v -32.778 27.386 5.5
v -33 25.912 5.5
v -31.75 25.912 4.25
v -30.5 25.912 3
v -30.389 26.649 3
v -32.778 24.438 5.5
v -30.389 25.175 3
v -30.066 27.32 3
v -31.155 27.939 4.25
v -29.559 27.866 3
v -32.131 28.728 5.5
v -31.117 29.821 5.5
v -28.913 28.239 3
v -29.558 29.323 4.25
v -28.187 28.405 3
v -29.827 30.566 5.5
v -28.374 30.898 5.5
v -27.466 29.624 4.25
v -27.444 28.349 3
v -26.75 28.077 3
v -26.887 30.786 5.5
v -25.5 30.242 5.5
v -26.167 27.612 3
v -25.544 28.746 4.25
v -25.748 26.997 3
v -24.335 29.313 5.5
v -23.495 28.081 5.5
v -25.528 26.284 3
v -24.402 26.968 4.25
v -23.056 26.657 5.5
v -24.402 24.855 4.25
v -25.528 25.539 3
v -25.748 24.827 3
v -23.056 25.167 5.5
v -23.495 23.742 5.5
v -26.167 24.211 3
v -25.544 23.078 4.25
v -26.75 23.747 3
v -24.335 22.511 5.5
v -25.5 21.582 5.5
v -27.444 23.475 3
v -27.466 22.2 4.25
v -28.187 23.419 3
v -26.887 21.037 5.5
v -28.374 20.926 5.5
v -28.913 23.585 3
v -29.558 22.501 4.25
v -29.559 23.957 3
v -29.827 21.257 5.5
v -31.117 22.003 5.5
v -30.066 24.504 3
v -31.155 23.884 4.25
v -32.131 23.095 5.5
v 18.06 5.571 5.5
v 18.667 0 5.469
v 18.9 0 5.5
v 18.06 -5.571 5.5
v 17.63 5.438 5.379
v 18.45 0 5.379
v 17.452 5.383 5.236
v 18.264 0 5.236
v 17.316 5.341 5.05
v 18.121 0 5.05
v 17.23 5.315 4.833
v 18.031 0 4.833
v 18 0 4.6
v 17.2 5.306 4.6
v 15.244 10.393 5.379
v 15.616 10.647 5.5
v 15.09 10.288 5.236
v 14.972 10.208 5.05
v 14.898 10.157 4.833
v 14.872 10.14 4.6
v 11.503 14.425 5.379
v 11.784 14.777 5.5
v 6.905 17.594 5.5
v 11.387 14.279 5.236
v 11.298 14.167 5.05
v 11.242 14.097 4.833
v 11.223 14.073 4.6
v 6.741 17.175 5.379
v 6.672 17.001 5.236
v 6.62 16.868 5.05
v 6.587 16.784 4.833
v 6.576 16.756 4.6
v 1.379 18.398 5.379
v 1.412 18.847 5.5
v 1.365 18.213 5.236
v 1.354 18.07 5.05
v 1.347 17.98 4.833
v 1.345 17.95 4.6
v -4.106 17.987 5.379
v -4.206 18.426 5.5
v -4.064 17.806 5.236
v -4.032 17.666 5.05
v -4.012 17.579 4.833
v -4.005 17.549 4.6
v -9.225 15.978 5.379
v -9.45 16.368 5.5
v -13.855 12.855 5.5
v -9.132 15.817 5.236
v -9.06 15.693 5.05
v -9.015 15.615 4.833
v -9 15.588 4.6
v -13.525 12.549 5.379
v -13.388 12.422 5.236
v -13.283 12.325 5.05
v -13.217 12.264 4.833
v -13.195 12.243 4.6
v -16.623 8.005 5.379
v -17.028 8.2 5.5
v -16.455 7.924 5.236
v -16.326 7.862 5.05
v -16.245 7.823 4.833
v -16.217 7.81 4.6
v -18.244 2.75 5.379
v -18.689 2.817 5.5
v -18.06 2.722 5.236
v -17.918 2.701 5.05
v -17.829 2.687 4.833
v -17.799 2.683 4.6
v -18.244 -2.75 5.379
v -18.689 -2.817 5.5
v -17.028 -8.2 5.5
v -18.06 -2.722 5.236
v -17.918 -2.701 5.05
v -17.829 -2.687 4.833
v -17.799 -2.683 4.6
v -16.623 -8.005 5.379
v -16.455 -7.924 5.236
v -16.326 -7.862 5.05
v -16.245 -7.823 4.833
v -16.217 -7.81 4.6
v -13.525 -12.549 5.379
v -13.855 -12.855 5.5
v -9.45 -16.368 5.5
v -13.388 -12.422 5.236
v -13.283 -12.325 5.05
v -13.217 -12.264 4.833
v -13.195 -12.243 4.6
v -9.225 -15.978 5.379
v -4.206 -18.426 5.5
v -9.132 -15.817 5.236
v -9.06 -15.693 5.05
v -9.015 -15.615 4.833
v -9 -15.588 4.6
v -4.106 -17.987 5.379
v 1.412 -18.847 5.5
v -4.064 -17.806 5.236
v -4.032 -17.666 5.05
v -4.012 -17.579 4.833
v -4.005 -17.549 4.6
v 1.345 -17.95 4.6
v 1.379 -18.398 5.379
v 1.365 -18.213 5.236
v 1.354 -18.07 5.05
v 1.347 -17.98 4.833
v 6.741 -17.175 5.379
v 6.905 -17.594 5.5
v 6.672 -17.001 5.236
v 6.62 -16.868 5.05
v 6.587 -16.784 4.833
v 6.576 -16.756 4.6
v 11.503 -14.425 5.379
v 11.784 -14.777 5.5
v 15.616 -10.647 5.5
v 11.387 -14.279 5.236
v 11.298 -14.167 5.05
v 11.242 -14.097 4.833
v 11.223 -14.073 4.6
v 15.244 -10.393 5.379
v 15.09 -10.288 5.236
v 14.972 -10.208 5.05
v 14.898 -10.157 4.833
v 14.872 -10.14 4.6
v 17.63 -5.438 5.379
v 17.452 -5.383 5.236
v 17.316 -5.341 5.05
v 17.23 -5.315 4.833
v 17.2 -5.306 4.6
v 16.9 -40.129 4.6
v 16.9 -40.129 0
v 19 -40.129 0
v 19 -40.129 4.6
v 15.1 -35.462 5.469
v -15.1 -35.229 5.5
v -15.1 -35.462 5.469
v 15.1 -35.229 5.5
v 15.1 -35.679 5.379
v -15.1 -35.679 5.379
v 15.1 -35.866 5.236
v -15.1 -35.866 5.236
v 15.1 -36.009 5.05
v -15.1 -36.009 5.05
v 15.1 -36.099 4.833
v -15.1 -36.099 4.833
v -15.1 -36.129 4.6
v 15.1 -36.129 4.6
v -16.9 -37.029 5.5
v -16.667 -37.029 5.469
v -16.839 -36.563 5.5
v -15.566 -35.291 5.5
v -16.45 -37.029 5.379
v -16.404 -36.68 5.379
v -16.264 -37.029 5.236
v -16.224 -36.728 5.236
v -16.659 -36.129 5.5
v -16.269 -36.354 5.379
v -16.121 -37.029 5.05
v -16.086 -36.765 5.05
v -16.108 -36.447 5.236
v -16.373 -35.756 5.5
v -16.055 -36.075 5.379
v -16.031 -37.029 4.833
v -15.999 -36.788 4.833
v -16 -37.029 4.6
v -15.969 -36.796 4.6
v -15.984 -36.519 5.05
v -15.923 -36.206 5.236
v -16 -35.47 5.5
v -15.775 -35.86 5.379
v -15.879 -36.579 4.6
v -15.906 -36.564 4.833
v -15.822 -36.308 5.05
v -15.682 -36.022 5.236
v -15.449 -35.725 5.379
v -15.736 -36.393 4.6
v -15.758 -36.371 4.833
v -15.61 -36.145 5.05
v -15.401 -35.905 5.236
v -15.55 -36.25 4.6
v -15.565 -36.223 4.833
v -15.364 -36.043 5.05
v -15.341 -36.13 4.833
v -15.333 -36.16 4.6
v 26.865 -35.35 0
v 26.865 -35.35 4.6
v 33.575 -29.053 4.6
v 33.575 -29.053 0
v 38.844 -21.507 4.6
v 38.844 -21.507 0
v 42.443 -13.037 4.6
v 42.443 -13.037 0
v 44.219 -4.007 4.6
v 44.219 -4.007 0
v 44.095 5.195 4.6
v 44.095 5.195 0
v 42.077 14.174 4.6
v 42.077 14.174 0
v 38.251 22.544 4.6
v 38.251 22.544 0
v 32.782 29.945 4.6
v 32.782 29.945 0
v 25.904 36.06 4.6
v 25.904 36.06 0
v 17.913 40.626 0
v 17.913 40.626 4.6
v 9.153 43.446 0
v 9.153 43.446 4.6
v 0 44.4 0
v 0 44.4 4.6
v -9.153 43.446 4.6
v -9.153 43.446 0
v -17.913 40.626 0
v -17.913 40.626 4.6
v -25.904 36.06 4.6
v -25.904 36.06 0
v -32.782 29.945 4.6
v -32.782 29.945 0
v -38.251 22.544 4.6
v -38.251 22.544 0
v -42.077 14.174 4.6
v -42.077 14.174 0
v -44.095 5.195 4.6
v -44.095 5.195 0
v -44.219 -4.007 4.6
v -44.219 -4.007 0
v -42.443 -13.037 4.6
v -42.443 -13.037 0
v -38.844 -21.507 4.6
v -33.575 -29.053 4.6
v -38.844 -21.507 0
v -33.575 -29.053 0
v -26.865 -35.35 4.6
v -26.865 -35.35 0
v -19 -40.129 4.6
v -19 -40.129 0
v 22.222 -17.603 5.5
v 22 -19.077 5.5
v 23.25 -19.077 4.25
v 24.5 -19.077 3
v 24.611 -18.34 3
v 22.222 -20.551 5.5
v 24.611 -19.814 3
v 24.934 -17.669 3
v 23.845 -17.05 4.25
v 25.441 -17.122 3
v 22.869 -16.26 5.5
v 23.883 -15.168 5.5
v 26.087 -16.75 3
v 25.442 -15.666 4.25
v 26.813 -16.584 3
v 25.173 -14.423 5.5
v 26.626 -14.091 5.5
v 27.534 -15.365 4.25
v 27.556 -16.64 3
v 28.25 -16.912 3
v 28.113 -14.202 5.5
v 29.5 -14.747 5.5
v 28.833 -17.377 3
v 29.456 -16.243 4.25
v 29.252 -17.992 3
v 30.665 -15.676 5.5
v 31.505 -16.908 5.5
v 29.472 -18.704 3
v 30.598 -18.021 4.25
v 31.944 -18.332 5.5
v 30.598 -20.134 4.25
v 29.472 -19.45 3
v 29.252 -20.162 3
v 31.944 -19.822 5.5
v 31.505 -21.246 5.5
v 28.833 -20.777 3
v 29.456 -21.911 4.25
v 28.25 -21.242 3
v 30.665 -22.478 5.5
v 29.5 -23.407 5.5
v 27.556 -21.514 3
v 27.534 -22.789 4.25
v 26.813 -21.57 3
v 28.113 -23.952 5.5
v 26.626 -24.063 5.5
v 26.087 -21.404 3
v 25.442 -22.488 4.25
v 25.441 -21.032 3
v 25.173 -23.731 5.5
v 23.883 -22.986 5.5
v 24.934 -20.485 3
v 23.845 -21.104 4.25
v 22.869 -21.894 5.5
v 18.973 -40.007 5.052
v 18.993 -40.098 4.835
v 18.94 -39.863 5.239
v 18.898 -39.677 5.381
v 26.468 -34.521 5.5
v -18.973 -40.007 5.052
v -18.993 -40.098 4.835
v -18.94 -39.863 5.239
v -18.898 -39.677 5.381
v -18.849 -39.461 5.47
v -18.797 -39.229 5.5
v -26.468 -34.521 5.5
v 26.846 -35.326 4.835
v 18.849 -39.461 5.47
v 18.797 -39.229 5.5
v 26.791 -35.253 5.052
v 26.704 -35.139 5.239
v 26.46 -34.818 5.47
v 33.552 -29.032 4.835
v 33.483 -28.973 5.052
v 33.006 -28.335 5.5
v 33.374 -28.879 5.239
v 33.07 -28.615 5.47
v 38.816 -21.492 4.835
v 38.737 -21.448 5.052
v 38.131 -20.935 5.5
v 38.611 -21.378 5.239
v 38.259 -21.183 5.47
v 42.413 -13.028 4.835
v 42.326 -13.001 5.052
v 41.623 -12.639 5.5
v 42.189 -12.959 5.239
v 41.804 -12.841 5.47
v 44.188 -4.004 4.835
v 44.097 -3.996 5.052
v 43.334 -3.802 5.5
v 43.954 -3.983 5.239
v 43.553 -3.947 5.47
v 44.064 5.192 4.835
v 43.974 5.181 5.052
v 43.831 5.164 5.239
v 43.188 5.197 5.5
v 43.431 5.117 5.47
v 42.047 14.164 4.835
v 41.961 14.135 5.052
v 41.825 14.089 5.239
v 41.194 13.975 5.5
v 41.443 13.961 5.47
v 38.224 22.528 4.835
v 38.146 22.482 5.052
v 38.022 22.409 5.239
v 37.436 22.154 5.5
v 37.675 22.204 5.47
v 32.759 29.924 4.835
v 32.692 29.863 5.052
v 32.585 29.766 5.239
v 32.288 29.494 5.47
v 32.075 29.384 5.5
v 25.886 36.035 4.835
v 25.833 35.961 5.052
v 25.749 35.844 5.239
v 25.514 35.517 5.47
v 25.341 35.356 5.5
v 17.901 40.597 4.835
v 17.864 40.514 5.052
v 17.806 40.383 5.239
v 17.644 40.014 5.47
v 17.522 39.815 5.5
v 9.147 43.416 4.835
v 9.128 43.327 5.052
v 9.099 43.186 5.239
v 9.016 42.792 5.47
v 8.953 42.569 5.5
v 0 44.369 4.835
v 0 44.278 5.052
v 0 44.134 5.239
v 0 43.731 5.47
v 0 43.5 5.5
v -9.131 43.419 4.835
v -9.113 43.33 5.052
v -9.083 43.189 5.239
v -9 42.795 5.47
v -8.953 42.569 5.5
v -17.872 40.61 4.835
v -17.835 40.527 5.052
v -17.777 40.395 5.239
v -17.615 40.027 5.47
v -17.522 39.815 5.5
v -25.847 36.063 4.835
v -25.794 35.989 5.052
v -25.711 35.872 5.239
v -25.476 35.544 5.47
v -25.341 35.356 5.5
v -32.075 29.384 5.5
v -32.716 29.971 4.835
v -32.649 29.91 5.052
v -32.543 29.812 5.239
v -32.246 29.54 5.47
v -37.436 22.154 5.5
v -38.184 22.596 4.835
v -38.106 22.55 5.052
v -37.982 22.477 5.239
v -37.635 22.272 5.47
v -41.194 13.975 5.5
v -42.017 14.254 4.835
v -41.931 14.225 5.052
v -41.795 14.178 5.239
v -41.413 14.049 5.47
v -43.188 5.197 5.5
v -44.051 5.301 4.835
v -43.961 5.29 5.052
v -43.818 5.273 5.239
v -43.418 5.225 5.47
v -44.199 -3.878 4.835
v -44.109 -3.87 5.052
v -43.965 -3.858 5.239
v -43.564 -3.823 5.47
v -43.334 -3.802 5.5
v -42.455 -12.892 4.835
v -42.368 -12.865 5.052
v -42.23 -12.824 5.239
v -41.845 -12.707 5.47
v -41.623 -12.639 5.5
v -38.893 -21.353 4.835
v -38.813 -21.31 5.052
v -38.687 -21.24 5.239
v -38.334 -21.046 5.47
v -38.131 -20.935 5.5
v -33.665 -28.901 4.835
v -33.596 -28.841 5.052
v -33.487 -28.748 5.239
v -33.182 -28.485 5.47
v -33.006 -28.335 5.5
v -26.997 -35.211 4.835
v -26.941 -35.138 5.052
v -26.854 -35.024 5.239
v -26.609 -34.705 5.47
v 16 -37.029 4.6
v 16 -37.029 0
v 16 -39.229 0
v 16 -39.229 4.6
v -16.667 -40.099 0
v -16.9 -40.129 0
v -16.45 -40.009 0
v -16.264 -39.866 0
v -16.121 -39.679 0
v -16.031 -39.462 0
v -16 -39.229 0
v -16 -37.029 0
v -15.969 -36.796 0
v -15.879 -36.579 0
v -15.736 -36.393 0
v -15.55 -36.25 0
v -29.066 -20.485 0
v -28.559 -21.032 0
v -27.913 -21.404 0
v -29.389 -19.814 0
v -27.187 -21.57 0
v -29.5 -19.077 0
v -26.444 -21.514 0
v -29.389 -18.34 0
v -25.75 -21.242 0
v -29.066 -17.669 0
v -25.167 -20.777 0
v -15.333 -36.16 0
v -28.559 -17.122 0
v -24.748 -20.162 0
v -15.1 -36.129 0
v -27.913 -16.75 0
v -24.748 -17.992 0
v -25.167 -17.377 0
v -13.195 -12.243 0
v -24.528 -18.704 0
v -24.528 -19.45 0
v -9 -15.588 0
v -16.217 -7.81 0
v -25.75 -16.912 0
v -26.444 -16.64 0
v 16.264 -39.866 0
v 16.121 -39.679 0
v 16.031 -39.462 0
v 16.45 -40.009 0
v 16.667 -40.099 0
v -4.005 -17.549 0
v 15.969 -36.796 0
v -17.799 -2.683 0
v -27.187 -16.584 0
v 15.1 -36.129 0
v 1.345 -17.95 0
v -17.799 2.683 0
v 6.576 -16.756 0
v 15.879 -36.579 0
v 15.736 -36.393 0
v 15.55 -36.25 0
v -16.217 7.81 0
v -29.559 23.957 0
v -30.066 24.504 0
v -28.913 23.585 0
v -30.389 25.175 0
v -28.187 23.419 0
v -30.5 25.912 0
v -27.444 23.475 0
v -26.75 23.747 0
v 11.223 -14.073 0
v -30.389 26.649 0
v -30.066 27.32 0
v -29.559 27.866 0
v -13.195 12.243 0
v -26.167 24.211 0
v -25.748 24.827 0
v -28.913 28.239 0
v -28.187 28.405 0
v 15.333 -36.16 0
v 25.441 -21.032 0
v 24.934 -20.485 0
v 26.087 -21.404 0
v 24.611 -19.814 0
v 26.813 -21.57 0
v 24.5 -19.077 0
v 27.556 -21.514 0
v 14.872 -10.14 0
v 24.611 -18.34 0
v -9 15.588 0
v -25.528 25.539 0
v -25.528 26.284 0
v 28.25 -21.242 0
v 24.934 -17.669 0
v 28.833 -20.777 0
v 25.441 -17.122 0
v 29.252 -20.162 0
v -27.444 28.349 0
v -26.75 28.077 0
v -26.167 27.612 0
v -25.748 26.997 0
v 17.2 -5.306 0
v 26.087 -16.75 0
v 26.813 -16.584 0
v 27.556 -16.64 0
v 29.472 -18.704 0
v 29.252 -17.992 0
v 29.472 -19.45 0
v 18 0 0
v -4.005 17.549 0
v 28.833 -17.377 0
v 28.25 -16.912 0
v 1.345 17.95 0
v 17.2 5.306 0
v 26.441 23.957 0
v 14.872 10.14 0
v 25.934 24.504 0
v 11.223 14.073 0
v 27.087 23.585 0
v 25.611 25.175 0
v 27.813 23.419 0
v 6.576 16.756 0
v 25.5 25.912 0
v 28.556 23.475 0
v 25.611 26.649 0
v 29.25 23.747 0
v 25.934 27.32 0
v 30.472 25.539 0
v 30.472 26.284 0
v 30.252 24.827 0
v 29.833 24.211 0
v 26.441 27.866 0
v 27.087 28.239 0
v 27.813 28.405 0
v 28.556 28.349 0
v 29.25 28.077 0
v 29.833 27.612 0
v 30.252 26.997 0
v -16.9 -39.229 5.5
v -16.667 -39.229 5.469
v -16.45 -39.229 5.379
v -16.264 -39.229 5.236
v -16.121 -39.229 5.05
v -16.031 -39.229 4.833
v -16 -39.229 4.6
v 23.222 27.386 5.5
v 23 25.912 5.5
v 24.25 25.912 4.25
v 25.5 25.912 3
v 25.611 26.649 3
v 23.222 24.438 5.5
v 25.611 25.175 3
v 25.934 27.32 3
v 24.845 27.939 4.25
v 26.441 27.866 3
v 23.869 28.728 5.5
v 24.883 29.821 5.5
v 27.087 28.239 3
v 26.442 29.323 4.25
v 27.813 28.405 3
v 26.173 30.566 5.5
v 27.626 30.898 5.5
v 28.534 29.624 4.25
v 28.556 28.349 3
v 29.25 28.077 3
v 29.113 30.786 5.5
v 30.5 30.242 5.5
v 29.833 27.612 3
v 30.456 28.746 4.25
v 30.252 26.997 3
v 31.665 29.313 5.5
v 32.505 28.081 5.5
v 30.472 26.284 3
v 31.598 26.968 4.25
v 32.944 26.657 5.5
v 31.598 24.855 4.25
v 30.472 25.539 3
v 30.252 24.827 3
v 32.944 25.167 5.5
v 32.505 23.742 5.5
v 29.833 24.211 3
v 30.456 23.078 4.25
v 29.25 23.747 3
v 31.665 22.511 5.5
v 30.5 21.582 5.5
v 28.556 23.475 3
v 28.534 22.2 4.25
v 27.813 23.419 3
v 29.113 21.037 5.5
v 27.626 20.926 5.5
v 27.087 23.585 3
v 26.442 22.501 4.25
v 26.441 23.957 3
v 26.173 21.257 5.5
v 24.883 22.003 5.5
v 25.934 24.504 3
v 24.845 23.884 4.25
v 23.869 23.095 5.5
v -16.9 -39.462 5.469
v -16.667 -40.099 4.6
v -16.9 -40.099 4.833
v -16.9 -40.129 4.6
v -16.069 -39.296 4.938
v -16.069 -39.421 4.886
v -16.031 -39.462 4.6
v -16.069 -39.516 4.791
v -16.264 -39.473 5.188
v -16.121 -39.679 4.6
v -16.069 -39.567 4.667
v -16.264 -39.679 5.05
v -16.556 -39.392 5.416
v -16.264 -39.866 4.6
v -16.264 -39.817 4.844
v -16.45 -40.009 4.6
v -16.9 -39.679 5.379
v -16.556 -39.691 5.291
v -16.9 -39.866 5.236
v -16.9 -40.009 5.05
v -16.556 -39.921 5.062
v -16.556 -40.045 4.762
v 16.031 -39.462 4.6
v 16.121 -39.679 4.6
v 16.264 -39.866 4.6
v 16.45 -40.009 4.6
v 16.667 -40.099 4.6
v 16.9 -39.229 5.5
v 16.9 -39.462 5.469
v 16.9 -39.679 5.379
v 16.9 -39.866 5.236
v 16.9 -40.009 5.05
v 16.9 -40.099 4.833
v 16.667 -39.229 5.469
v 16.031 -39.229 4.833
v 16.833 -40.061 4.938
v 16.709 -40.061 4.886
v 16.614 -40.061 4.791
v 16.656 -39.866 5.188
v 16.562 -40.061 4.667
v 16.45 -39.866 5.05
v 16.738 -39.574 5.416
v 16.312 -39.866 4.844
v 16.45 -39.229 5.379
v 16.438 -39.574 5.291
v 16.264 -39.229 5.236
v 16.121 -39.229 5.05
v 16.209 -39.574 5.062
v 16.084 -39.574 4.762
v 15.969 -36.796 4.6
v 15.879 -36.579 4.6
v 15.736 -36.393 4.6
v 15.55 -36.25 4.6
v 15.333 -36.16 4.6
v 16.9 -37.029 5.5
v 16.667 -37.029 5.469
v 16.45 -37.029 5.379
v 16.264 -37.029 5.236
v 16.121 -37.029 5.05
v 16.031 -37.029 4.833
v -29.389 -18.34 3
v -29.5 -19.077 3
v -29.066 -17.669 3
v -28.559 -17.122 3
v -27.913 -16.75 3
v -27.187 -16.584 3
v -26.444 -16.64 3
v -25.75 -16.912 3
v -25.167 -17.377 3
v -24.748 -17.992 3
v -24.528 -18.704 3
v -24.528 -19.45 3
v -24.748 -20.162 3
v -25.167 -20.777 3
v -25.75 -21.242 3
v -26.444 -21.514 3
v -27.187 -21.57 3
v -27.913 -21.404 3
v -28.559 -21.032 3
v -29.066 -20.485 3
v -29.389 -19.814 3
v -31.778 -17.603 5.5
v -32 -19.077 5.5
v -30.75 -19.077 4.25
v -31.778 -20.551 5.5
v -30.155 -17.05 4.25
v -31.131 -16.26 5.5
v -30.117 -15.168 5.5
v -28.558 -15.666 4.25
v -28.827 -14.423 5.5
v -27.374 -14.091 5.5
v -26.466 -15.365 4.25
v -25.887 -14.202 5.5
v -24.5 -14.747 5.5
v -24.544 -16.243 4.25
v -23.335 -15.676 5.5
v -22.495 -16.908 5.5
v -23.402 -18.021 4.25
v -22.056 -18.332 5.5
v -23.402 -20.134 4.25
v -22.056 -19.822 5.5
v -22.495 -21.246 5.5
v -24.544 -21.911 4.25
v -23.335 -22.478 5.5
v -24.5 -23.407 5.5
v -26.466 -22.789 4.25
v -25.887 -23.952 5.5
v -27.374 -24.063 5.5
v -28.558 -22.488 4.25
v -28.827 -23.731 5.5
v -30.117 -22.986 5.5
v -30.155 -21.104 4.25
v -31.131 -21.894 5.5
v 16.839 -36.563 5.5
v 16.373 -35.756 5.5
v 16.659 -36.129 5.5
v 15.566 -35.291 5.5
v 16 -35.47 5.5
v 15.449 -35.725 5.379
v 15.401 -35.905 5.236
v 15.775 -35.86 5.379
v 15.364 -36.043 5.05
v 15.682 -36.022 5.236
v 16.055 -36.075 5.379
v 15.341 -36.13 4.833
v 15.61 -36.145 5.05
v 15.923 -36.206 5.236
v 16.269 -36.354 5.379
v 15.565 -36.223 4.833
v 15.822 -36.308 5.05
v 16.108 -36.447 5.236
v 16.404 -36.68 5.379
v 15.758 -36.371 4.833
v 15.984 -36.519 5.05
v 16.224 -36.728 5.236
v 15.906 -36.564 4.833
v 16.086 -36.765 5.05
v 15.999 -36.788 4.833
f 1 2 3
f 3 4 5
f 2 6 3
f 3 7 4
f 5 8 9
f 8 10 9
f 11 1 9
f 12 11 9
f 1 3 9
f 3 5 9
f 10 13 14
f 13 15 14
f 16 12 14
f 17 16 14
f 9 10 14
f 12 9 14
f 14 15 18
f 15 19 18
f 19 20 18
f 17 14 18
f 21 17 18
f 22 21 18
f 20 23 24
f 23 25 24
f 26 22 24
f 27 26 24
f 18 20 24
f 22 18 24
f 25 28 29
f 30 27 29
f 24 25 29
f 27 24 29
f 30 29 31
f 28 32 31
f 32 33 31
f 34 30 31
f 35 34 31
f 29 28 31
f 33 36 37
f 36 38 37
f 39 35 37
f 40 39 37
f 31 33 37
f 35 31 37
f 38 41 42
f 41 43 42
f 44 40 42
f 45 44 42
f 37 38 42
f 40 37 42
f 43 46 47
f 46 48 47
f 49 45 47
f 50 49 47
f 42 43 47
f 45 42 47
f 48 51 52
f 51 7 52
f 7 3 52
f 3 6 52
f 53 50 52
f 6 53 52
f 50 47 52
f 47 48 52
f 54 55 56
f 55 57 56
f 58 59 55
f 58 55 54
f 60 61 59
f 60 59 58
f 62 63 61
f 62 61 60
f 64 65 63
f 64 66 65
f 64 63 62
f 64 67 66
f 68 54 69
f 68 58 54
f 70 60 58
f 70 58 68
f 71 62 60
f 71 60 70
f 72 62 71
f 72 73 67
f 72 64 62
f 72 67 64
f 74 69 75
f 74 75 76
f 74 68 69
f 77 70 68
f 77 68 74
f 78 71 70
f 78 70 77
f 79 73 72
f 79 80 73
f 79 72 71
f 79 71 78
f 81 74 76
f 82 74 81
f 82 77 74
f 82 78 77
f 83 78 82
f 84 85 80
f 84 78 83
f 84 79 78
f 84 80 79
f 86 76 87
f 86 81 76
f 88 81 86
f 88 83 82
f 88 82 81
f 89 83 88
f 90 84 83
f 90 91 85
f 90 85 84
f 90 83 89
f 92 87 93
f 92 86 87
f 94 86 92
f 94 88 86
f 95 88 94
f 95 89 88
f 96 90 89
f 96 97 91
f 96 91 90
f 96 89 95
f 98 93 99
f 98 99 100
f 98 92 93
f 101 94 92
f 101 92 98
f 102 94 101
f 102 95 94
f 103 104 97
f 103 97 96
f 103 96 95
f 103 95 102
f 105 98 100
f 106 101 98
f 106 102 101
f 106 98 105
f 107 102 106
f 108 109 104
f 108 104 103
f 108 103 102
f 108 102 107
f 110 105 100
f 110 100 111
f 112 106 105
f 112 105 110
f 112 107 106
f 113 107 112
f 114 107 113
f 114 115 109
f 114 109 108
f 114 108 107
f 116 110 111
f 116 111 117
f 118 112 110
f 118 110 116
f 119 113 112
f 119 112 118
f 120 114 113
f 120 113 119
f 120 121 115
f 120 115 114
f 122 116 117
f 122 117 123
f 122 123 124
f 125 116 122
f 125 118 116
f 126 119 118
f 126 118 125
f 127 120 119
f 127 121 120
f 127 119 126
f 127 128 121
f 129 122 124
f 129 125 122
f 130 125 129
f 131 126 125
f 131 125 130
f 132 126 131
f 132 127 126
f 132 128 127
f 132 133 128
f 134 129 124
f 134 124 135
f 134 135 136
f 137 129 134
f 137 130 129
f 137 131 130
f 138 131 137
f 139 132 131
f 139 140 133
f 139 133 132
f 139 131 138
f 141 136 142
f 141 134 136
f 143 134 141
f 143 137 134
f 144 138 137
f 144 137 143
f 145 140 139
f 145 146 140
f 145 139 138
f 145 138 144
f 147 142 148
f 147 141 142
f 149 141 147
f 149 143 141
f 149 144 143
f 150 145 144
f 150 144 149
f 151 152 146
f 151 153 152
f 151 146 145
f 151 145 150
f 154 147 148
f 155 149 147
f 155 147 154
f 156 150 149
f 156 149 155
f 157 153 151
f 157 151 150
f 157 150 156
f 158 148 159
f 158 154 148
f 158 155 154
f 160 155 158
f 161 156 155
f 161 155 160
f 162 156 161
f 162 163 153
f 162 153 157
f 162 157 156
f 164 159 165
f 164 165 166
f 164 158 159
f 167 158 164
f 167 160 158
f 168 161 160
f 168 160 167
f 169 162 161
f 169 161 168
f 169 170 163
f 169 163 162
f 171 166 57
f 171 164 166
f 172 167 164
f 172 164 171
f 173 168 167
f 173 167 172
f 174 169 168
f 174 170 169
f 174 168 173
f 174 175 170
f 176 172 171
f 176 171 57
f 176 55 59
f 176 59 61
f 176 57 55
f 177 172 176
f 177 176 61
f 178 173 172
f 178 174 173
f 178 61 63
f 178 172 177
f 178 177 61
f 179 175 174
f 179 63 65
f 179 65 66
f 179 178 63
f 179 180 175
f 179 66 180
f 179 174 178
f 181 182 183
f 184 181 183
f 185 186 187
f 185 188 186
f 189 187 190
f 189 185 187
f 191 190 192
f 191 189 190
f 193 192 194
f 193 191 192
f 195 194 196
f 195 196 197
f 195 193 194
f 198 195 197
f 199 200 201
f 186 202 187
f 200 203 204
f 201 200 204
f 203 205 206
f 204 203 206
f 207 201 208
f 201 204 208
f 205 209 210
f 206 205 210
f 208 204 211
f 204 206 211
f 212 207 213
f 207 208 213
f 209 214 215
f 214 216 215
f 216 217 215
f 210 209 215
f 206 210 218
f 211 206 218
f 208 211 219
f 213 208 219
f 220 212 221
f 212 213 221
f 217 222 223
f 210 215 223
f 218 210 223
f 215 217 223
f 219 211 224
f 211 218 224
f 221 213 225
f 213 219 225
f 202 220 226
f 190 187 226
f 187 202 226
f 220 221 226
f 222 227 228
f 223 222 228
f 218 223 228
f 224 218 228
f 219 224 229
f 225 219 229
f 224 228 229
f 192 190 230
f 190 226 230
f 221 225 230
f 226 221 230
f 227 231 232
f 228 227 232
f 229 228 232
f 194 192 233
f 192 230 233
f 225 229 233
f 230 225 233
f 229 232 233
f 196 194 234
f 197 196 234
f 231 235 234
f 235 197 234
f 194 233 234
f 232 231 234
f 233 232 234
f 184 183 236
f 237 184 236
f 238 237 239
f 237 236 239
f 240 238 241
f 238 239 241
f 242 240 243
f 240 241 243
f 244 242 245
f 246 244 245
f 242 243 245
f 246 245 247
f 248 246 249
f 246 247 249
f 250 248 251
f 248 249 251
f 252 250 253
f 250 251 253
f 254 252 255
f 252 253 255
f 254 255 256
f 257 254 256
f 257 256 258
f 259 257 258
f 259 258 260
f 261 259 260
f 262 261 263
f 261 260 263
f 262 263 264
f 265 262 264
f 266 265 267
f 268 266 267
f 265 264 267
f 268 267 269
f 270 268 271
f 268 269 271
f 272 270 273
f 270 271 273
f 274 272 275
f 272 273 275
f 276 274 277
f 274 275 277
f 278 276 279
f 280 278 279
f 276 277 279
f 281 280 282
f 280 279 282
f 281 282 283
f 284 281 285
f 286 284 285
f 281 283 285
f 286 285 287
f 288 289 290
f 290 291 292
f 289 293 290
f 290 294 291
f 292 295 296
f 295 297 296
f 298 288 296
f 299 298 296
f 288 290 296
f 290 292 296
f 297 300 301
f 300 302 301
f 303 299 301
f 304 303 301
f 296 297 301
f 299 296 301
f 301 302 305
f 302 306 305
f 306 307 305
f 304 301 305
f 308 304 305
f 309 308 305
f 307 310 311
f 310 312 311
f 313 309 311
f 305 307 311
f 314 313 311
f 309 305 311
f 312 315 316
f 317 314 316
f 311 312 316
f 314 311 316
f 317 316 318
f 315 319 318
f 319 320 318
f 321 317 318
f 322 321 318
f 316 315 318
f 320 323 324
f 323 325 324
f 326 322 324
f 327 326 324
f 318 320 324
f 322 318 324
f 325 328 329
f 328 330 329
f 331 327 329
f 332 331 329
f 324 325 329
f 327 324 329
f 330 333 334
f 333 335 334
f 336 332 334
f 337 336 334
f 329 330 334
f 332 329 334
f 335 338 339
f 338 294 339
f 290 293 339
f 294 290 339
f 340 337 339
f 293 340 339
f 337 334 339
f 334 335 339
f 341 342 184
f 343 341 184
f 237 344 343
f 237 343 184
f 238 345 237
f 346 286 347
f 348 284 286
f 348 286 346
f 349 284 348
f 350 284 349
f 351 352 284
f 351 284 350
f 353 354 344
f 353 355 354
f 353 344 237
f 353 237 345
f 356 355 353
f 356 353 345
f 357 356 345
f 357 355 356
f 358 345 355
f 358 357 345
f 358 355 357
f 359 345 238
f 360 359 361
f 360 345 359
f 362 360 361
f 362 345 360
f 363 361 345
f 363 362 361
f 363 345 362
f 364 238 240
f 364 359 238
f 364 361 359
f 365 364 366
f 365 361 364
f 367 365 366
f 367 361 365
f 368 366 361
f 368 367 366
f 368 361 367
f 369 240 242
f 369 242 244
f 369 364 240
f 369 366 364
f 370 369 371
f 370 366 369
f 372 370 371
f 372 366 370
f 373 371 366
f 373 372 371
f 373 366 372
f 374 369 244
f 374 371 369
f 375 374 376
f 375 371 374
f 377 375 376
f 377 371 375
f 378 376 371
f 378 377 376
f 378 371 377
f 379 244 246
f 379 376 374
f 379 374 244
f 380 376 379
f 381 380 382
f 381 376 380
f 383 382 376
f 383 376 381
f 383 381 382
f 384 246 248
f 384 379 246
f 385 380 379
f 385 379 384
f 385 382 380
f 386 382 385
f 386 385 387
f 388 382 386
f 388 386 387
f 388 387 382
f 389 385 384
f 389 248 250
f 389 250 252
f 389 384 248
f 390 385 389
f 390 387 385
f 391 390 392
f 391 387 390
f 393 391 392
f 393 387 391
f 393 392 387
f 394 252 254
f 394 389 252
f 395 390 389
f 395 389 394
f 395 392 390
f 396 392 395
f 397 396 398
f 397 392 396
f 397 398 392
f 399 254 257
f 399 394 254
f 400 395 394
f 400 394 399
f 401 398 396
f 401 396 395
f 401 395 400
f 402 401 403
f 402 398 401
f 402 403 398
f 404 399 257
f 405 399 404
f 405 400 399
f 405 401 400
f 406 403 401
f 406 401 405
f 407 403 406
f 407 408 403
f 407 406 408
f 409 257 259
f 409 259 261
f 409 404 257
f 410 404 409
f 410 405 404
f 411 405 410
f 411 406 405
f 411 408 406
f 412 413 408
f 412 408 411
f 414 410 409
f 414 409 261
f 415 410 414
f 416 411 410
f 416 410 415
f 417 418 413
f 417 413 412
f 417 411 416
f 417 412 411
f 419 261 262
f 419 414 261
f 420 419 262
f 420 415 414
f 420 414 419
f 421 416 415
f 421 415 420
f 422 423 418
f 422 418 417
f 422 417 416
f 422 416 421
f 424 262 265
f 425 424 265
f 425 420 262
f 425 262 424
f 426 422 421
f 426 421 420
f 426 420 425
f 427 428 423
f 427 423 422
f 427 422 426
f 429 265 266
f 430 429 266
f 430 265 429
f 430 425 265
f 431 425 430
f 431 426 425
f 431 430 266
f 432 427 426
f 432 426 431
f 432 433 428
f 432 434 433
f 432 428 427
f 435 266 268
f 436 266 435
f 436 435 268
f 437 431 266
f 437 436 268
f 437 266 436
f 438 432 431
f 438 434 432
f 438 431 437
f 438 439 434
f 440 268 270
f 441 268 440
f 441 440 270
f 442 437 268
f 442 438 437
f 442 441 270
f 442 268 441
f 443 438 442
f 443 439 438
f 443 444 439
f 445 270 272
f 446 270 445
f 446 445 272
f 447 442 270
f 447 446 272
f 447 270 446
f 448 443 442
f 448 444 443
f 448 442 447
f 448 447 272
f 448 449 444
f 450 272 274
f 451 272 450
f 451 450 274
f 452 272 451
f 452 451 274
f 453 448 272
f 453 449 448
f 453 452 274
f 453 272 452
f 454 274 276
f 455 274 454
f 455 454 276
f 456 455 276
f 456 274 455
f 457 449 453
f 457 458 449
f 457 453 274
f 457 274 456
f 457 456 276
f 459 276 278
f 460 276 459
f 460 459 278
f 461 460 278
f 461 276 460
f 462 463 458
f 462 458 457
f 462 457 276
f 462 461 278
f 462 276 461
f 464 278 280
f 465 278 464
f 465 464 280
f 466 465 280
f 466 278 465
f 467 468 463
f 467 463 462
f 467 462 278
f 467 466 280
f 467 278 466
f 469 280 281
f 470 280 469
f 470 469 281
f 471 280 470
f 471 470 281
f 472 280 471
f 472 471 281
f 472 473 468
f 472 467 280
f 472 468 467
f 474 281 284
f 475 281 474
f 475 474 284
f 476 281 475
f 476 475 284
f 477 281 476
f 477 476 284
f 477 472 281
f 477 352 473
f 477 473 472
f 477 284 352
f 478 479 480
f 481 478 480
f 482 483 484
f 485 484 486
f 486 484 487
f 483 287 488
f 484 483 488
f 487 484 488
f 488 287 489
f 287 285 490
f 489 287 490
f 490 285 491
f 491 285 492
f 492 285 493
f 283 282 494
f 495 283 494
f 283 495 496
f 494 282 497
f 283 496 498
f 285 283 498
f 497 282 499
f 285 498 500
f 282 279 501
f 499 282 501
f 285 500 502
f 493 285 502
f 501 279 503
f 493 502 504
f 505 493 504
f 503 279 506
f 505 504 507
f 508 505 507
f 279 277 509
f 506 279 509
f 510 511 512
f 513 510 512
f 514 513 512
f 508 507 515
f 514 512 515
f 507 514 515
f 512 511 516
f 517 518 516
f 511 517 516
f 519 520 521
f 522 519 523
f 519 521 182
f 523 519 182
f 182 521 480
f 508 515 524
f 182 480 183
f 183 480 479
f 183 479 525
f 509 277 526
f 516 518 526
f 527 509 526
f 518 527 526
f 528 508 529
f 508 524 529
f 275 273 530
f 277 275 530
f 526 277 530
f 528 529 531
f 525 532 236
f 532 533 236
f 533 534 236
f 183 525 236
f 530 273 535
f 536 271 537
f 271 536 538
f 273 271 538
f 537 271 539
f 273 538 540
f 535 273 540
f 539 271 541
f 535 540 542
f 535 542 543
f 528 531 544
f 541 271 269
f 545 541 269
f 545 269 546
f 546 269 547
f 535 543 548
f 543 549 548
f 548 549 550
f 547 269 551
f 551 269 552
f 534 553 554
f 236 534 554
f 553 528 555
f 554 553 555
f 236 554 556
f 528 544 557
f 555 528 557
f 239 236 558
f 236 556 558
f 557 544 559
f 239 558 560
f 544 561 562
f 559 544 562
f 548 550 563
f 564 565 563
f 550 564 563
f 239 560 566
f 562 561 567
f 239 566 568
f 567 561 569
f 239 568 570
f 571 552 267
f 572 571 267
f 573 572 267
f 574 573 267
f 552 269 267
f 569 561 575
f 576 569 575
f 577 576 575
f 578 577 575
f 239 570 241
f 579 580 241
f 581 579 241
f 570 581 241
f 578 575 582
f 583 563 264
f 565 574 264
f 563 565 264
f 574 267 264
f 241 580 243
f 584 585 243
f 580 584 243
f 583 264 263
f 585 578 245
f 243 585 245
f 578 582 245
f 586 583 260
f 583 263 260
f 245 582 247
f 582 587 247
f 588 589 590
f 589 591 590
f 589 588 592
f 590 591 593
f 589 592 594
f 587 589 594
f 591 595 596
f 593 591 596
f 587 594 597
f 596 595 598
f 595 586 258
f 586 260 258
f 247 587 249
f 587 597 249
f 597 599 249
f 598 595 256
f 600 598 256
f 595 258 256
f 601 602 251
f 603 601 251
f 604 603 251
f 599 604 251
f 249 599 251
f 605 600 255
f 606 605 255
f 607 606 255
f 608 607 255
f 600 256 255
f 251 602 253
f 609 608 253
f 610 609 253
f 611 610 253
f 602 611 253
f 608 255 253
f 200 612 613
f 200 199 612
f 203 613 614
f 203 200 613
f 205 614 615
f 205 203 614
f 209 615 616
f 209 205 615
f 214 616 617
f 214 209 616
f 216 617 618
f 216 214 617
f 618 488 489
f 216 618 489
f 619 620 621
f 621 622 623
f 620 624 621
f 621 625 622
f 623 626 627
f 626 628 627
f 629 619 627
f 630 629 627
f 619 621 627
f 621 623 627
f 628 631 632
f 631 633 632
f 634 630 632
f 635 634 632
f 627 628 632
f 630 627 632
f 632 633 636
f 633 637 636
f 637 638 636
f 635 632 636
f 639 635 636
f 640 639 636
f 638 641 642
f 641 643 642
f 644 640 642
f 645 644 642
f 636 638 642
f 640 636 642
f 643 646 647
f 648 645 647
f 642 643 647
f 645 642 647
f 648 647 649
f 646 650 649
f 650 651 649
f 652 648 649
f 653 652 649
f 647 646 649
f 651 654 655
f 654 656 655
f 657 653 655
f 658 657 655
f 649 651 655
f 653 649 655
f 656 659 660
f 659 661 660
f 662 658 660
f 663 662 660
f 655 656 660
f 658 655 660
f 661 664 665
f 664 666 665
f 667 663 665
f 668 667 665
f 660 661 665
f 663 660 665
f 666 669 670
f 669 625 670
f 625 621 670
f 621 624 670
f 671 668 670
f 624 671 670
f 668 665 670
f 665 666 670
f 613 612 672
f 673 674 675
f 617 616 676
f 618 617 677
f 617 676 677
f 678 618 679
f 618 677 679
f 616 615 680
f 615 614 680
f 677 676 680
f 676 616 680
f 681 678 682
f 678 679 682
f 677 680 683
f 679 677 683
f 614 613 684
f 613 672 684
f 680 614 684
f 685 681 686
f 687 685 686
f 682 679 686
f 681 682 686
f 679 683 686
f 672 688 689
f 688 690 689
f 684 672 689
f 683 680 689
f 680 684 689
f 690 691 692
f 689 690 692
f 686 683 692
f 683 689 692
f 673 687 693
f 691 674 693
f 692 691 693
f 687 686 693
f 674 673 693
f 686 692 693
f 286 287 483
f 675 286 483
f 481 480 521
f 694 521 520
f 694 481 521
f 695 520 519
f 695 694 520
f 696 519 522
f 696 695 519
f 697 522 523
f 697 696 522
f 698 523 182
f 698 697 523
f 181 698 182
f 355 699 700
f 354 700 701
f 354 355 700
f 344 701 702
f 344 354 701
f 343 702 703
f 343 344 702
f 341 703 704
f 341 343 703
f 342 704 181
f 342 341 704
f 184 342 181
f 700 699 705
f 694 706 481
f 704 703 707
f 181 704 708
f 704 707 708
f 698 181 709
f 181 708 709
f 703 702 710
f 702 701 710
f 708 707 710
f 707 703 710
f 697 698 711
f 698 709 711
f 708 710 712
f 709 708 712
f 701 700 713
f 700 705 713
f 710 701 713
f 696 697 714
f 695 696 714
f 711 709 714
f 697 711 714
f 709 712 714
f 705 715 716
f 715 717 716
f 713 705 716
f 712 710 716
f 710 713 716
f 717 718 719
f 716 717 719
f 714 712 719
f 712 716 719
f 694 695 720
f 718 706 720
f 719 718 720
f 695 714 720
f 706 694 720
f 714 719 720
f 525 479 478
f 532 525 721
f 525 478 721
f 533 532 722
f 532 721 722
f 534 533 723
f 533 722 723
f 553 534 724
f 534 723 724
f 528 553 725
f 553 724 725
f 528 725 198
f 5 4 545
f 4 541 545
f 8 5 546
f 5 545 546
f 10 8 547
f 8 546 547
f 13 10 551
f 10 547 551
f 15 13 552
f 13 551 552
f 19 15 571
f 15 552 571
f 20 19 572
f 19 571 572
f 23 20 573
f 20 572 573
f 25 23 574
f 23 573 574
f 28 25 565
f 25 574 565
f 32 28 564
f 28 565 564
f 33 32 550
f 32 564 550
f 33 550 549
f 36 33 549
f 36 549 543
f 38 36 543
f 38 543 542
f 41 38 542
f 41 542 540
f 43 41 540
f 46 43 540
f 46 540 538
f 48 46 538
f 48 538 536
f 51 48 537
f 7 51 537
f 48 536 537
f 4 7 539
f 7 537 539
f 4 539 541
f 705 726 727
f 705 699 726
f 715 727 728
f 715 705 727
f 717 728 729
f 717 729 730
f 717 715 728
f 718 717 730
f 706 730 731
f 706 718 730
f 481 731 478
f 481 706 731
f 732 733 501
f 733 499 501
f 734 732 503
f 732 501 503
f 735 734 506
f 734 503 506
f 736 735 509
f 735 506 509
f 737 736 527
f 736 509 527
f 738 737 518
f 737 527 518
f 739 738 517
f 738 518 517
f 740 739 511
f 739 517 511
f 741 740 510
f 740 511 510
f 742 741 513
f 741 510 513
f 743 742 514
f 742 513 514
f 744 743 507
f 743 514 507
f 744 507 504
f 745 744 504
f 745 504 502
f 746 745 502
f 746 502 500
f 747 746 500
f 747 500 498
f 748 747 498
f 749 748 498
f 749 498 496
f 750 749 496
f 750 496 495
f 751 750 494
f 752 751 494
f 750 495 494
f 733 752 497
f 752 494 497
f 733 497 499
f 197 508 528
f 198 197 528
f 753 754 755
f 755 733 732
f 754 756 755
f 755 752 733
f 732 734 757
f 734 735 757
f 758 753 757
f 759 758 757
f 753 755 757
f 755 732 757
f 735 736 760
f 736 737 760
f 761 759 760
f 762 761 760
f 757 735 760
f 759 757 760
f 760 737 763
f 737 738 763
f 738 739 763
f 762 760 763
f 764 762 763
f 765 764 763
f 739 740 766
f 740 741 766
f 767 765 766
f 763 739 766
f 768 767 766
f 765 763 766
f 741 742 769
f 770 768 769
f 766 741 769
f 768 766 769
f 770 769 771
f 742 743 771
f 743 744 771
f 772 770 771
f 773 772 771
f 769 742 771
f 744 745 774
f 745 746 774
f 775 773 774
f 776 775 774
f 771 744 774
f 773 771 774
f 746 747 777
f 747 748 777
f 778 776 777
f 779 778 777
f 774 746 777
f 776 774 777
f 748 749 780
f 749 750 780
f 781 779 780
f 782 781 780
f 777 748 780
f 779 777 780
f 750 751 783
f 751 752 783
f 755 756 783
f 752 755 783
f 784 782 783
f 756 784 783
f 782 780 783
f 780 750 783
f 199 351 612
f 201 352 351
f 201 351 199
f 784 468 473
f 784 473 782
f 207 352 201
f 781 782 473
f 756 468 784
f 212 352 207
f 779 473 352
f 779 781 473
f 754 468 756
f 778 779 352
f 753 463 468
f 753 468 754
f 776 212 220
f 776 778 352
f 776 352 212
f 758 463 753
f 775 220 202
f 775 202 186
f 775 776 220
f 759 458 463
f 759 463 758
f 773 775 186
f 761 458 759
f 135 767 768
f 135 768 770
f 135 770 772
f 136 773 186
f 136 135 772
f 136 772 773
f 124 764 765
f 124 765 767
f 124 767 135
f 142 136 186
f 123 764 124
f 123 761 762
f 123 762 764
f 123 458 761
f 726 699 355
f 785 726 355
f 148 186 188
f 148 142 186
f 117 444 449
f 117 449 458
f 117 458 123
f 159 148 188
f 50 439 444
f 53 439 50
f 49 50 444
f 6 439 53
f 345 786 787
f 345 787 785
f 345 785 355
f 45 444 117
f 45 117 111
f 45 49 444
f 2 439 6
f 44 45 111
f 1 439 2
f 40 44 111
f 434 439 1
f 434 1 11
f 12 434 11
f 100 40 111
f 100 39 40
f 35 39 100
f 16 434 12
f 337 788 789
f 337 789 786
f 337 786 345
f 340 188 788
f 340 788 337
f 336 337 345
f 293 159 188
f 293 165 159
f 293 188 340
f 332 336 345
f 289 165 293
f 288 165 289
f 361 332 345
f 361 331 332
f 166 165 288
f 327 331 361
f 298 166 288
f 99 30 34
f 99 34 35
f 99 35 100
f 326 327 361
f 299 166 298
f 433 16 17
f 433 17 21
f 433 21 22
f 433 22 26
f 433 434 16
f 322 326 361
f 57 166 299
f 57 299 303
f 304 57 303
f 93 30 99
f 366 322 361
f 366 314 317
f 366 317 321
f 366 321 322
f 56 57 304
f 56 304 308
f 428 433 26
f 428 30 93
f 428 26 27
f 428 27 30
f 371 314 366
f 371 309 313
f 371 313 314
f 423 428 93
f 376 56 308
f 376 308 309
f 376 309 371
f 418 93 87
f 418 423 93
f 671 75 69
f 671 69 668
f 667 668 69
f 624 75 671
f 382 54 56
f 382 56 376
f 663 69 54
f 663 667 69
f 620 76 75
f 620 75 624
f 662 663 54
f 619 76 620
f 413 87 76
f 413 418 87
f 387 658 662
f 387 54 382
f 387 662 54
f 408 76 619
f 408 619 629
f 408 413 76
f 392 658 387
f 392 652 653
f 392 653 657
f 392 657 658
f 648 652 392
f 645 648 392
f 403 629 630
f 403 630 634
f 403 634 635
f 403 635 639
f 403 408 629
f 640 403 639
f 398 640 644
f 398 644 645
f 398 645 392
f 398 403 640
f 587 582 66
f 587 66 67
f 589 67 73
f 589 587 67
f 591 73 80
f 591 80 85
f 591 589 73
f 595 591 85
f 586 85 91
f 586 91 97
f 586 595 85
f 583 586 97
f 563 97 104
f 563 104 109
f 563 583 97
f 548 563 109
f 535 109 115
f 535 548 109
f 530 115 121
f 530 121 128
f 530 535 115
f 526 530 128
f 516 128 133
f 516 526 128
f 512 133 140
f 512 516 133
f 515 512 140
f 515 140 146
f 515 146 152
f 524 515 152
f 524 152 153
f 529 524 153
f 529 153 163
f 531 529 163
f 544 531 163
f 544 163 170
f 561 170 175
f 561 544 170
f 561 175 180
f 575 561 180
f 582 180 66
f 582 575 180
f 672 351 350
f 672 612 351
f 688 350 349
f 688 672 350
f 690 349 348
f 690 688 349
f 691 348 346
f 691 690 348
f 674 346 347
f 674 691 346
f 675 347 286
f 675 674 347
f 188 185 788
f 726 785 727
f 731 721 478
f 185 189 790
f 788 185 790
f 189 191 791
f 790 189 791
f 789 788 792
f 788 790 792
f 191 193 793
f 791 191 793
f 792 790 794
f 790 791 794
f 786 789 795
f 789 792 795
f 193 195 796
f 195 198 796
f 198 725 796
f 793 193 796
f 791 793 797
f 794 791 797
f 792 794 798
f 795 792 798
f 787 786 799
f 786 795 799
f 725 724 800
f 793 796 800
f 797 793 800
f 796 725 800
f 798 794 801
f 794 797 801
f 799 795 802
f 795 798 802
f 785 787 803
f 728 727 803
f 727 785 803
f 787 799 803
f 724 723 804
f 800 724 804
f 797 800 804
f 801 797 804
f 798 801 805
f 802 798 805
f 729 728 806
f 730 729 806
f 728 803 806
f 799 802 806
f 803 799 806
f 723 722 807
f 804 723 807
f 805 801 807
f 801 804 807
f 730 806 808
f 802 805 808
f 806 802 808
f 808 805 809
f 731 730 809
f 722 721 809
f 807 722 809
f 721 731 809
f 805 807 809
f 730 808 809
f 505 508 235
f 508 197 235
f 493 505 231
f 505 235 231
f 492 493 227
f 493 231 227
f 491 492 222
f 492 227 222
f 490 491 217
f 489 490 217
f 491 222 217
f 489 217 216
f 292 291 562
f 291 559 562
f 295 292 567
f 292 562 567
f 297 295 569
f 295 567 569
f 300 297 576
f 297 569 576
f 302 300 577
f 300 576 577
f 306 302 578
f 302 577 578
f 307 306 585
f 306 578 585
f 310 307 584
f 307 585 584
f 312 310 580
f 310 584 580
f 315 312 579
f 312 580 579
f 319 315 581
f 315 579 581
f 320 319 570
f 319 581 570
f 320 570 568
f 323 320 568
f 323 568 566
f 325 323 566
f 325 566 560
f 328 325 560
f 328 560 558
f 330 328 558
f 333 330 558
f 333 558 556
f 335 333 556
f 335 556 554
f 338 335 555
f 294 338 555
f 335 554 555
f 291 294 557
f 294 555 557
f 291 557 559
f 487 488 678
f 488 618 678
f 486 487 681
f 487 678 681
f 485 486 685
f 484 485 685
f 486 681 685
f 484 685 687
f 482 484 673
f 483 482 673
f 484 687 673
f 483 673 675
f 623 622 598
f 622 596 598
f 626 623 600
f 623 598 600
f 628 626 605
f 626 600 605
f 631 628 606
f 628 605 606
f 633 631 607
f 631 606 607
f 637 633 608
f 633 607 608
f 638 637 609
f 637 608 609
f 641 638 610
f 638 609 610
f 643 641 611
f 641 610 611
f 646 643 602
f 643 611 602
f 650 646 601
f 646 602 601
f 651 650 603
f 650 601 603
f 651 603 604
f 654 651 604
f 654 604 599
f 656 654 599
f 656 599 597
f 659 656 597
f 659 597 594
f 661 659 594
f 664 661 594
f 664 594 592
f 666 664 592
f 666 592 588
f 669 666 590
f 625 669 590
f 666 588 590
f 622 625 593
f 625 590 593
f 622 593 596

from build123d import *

# Parameters (mm, degrees)
SKETCH_R         = 18
PAD_DEPTH        = 5.5
HOLE_D           = 5
HOLE_CSINK_D     = 10
HOLE_CSINK_ANGLE = 90
FILLET_R         = 0.9


with BuildPart() as part:
    # Sketch → Pad (new body)
    with BuildSketch(Plane.XY):
        with BuildLine():
            ThreePointArc((19, -40.129291), (0, 44.4), (-19, -40.129291))
            Line((-19, -40.129291), (-16, -40.129291))
            Line((-16, -40.129291), (-16, -36.129291))
            Line((-16, -36.129291), (16, -36.129291))
            Line((16, -36.129291), (16, -40.129291))
            Line((16, -40.129291), (19, -40.129291))
        make_face()
        Circle(SKETCH_R, mode=Mode.SUBTRACT)
    extrude(amount=PAD_DEPTH)

    # Hole (through all)
    with Locations(Plane.XY.offset(5.5)):
        with Locations((28, 25.911822), (-28, 25.911822), (-27, -19.077066), (27, -19.077066)):
            CounterSinkHole(HOLE_D / 2, HOLE_CSINK_D / 2, counter_sink_angle=HOLE_CSINK_ANGLE)

    # Fillet
    fillet_edges = [part.edges().sort_by_distance(p)[0] for p in [
        (0, 44.4, 5.5),
        (-18, 0, 5.5),
        (-17.5, -40.129291, 5.5),
        (-16, -38.129291, 5.5),
        (0, -36.129291, 5.5),
        (16, -38.129291, 5.5),
        (17.5, -40.129291, 5.5),
        (-16, -40.129291, 2.75),
        (16, -40.129291, 2.75),
        (-16, -36.129291, 2.75),
        (16, -36.129291, 2.75),
    ]]
    fillet(fillet_edges, radius=FILLET_R)


solid = part.part
